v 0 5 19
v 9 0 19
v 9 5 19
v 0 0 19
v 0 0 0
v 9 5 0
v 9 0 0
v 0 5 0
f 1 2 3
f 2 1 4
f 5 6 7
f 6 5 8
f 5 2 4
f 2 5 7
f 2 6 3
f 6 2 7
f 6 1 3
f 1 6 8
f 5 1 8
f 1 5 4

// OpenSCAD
// Generated by SolidPython 1.0.1 on 2020-07-29 00:46:55


cube(size = [9, 5, 19]);
/***********************************************
*********      SolidPython code:      **********
************************************************
 
# import packages: SolidPython
from solid import *
from solid.utils import *
from itertools import chain, combinations, permutations


class Resize:

    def __init__(self, scad_file):
        self.scad_file = scad_file
        #self.scad_file = import_scad(scad_file)
        # cone/cylinder param:
        self.r1 = 0
        self.r2 = 0
        self.h = 0
        # rectangular prism param:
        self.w = 0
        self.l = 0
        # ellipse param:
        self.r = 0

    # import OpenScad code (file name corresponds to shape)


    # classify shape + parameters
    def assign(self, param1, param2, param3):
        if self.scad_file == 'cone.scad':
            self.r1 = param1
            self.r2 = param2
            self.h = param3
        elif self.scad_file == 'cylinder.scad':
            self.r1 = param1
            self.r2 = param2
            self.h = param3
        elif self.scad_file == 'rectangularPrism.scad':
            self.h = param1
            self.l = param2
            self.w = param3
        else:
            self.r = param1
            self.h = param2

    # resize parameters
    def iterate(self):
        x = range(3, 20, 2)
        i = 1
        if self.scad_file == 'cone.scad':
            tempList = list(permutations(x, 2))
            for temp in tempList:
                param1 = temp[0]
                param2 = temp[1]
                filepath = 'produced_scad_files/' + 'cone' + str(param1) + '_' + str(param2) + '_' + '.scad'
                scad_render_to_file(cylinder(h=param1, r1=param2, r2=0), filepath)

        elif self.scad_file == 'cylinder.scad':
            tempList = list(permutations(x, 3))
            for temp in tempList:
                param1 = temp[0]
                param2 = temp[1]
                filepath = 'produced_scad_files/' + 'cylinder' + str(param1) + '_' + str(param2) + '_' + '.scad'
                scad_render_to_file(cylinder(h=param1, r1=param2, r2=param2), filepath)

        elif self.scad_file == 'rectangularPrism.scad':
            tempList = list(permutations(x, 3))
            for temp in tempList:
                param1 = temp[0]
                param2 = temp[1]
                param3 = temp[2]
                filepath = 'produced_scad_files/' + 'rectangularPrism' + str(param1) + '_' + str(param2) + '_' + str(
                    param3) + '.scad'
                scad_render_to_file(cube(size=(param1, param2, param3)), filepath)

        elif self.scad_file == 'ellipse.scad':
            tempList = list(permutations(x, 4))
            for temp in tempList:
                param1 = temp[0]
                param2 = temp[1]
                param3 = temp[2]
                param4 = temp[3]
                filepath = 'produced_scad_files/' + 'ellipse' + str(param1) + '_' + str(param2) + '_' + str(param3) + '_' + str(param4) + '.scad'
                scad_render_to_file(scale([param1, param2, param3])(sphere(r=param4)), filepath)

    def render_to_scadfile(self):
        scad_render_to_file(scad, 'example.scad') 
 
************************************************/
